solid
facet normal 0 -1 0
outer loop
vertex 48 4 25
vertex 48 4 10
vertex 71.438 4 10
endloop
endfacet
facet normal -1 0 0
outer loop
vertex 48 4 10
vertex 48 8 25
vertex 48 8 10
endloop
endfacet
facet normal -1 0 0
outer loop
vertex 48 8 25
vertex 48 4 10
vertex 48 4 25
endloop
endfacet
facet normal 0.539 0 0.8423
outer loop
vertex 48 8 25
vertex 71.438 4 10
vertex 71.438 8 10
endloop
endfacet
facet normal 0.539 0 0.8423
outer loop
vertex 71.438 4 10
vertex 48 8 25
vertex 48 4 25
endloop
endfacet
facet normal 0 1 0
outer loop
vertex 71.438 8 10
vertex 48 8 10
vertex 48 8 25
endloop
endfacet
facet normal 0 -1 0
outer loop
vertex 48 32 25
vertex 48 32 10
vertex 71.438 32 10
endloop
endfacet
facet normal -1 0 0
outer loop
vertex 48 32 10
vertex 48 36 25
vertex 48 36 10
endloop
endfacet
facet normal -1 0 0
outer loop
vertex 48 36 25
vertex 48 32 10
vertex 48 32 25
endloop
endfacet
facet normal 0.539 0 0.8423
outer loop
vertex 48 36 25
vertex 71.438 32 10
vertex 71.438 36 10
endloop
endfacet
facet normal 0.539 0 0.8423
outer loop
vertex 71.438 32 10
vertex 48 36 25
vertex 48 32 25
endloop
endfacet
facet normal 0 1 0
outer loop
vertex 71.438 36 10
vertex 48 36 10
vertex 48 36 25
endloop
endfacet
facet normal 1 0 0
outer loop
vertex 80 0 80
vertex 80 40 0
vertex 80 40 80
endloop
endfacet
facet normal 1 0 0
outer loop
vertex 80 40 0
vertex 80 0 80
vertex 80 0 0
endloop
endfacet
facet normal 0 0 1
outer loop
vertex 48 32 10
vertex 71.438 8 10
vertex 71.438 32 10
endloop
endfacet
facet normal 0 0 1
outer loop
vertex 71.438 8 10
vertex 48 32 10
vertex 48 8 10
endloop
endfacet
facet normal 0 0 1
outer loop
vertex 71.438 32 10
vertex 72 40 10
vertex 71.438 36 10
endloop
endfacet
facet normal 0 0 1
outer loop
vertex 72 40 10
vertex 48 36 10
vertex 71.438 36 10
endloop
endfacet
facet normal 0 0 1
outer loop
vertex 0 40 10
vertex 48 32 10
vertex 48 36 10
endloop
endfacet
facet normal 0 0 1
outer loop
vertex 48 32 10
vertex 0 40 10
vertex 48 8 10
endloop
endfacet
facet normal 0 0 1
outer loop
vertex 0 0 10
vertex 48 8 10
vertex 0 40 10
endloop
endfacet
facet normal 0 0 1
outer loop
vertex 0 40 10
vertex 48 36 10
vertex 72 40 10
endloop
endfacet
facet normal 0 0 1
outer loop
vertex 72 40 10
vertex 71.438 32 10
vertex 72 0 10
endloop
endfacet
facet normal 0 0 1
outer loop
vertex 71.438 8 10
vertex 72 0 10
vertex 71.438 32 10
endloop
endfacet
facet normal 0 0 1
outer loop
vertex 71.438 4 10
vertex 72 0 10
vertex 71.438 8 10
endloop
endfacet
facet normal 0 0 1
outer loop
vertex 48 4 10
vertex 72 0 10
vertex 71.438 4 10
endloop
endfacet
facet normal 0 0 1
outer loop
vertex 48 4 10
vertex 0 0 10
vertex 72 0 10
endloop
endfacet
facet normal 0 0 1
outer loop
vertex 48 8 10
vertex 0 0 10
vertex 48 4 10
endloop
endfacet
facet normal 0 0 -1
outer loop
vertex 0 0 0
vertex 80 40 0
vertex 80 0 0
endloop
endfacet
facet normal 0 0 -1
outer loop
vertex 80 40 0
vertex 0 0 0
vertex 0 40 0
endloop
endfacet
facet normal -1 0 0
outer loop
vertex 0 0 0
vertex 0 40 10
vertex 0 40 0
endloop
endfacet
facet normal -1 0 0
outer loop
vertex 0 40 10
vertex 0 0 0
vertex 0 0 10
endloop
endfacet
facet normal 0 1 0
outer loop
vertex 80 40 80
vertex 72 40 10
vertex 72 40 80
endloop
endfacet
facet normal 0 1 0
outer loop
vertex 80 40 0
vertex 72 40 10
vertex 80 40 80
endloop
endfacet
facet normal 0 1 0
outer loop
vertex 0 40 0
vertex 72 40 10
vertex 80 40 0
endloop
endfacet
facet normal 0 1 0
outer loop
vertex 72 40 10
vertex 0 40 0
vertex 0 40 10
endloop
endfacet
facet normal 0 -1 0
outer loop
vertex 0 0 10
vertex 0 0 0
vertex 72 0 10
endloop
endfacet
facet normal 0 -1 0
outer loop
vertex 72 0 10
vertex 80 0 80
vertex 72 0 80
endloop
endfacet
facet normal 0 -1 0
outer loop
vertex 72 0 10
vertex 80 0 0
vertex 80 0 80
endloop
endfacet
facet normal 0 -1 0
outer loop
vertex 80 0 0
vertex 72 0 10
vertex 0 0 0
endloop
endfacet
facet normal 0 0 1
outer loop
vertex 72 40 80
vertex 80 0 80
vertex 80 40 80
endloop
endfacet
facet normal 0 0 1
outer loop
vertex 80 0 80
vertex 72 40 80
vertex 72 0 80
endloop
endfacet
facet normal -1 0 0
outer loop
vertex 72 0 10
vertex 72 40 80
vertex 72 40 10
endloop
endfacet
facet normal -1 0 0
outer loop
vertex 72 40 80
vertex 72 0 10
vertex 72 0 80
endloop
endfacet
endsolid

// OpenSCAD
$fn = 32;

// ----------------------------------------------------------------------
// Rib bracket: 2-gusset L bracket
// ----------------------------------------------------------------------

// --- parameters (mm) ---
base_l = 80;              // foot length, X
base_w = 40;              // foot width, Y
base_t = 10;              // foot thickness
plate_t = 8;              // upright plate thickness
plate_h = 80;             // overall height
gus_l = 24;               // gusset leg along the foot
gus_h = 16;               // gusset height
gus_t = 4;                // gusset thickness
gus_edge = 4;             // gusset margin from the foot edge
n_gus = 2;                // gusset count

gus_pitch = (base_w - 2 * gus_edge - gus_t) / (n_gus - 1);  // gusset pitch

union() {
  cube([base_l, base_w, base_t]);
  translate([base_l - plate_t, 0, base_t - 1])
    cube([plate_t, base_w, plate_h - base_t + 1]);
  for (i = [0 : n_gus - 1])
    translate([base_l - plate_t - gus_l, gus_edge + i * gus_pitch, base_t - 1])
      rotate([-90, 0, 0])
        linear_extrude(height = gus_t)
          polygon(points = [[0, 0], [gus_l + 1, 0], [0, -gus_h]]);
}
